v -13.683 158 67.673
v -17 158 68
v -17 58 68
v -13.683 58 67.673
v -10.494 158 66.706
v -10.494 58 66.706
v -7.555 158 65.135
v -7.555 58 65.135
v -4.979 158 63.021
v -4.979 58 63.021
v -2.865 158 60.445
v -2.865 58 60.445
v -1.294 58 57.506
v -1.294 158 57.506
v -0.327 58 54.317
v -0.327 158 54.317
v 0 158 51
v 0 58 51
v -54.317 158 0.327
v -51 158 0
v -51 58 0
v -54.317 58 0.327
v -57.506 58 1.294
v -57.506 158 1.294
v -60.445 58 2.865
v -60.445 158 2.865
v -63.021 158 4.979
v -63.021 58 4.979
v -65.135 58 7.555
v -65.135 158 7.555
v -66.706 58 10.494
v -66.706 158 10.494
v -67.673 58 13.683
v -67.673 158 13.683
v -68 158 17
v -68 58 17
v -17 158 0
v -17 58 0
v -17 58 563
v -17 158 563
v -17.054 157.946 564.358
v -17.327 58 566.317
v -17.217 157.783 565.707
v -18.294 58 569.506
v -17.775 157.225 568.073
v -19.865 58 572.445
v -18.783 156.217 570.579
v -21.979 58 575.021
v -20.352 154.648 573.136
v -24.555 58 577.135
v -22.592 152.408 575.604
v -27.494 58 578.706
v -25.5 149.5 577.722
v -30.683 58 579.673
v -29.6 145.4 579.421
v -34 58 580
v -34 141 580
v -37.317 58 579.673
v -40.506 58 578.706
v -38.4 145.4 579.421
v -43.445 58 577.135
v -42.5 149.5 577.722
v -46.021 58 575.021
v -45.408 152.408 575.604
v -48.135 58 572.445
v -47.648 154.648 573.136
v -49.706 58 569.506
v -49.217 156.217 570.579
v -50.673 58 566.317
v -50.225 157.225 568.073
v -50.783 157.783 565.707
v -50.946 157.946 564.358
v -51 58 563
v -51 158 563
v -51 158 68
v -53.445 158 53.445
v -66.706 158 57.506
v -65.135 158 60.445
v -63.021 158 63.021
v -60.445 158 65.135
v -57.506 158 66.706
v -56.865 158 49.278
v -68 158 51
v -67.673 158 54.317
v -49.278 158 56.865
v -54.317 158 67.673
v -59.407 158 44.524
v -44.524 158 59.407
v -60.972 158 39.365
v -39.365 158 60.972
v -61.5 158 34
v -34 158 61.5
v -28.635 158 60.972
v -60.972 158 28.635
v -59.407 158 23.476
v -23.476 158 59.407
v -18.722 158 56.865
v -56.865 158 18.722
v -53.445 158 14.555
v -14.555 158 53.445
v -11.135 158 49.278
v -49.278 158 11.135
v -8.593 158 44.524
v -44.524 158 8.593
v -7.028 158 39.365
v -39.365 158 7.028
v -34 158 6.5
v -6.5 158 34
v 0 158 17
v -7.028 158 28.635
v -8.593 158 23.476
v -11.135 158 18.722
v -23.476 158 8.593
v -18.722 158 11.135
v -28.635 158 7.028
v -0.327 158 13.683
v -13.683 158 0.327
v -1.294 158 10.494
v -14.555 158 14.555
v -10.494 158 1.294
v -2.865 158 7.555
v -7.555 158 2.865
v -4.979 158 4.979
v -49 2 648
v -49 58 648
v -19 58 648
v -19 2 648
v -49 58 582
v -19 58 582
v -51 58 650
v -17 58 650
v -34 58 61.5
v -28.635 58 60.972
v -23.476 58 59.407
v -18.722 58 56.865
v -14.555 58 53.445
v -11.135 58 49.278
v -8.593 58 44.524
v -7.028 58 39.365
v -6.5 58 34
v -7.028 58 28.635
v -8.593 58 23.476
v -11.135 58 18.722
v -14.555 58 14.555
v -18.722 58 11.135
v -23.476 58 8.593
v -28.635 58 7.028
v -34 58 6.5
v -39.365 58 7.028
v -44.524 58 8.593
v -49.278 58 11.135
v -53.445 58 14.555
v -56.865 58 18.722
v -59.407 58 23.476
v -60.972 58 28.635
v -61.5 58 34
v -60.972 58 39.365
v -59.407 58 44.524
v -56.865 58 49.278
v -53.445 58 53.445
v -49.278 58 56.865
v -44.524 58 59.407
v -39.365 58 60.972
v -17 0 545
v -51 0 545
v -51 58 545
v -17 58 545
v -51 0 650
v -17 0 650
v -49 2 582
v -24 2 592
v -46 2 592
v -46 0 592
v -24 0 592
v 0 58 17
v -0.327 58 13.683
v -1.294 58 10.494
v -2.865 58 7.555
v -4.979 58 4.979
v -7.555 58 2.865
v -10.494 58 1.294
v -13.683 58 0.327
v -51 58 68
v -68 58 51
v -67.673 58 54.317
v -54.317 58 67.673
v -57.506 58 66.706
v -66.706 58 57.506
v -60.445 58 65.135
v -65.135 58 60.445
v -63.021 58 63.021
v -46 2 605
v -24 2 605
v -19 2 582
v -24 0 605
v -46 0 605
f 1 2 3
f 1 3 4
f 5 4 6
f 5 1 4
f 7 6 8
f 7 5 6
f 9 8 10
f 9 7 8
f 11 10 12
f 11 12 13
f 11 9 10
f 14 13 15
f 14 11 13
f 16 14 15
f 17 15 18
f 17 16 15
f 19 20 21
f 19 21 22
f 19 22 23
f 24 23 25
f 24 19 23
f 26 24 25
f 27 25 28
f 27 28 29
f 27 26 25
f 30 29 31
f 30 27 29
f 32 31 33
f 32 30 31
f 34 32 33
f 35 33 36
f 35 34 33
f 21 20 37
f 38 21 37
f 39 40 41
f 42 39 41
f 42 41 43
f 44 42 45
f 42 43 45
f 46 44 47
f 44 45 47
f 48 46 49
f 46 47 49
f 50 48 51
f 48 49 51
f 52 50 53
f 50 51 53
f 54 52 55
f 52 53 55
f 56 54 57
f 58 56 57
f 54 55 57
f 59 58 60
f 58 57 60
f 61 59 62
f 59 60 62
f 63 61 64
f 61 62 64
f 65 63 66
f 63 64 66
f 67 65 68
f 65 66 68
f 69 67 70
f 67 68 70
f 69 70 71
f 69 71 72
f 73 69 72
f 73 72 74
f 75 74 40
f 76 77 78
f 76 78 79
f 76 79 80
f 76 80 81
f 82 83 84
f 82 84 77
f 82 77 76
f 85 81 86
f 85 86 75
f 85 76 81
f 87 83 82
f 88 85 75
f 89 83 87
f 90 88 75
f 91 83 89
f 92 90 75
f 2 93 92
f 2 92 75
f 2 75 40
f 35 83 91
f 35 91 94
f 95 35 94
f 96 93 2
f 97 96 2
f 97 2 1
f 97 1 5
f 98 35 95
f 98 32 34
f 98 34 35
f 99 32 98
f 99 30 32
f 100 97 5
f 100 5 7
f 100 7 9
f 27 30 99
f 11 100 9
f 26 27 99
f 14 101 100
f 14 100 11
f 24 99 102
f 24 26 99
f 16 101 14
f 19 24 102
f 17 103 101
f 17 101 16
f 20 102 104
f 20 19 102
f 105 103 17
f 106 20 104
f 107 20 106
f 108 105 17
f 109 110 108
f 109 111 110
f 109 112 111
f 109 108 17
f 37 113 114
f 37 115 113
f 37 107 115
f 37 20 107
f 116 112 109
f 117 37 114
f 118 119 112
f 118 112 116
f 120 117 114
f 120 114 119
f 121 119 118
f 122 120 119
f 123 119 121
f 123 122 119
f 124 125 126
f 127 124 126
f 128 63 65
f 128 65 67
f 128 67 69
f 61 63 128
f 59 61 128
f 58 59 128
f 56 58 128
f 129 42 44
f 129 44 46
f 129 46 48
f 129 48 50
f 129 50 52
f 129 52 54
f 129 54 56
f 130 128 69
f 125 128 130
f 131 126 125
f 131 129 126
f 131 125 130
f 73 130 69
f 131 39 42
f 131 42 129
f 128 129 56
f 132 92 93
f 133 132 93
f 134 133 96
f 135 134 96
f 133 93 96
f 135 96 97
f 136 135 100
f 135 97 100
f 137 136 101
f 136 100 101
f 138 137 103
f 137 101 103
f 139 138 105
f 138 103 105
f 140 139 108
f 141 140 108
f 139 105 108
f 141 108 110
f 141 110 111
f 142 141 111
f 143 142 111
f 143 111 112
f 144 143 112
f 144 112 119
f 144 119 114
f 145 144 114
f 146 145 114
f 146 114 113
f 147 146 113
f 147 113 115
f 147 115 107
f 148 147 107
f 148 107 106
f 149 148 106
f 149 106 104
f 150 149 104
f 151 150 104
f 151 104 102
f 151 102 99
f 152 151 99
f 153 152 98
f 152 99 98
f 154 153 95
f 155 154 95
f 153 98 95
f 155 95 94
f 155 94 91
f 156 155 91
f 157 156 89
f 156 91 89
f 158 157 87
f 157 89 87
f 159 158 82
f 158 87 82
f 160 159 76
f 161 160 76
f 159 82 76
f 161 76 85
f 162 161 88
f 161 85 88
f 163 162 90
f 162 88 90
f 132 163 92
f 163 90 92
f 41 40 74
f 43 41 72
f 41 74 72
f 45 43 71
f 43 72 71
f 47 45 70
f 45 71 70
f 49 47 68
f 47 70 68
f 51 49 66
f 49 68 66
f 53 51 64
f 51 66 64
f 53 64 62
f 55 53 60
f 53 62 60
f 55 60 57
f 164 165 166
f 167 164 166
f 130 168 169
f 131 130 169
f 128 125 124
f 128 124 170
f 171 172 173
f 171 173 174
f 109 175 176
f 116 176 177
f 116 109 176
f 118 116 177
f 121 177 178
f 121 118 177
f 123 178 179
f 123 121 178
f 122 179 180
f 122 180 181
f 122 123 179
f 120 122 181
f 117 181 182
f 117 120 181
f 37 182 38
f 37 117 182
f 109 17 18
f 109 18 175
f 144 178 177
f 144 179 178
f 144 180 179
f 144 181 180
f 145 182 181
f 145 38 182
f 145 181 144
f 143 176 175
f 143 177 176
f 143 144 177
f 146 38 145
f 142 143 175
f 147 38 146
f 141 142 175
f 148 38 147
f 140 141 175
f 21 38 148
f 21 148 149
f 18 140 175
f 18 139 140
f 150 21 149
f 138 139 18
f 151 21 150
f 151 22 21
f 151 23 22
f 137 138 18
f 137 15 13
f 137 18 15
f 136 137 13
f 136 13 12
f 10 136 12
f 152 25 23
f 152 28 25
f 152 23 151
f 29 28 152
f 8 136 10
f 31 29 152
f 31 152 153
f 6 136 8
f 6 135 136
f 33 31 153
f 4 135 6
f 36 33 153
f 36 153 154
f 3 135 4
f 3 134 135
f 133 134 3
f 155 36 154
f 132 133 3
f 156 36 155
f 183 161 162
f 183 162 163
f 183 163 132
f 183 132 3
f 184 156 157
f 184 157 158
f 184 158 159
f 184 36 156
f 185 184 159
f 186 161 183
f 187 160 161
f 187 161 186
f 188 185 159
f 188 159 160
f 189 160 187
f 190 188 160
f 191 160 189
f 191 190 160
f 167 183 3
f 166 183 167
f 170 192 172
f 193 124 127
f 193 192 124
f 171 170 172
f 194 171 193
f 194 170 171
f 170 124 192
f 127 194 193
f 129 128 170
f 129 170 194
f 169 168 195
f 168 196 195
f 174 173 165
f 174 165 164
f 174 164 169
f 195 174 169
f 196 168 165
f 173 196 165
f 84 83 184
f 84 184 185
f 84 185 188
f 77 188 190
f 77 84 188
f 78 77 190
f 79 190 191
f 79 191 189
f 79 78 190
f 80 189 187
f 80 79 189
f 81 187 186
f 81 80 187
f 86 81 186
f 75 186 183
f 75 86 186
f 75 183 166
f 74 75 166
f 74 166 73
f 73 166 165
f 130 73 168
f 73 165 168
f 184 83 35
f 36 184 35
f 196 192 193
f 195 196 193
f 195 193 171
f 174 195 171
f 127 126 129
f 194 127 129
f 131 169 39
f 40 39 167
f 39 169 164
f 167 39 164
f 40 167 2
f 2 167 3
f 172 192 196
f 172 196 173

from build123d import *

# Parameters (mm, degrees)
SKETCH2_W           = 34
SKETCH2_H           = 512
SKETCH2_H_2         = 70
SKETCH2_W_2         = 68
SKETCH2_H_3         = 68
BOSS_EXTRUDE1_DEPTH = 158
FILLET1_R           = 17
SKETCH3_W           = 599.373930515
SKETCH3_H           = 58
CUT_EXTRUDE1_DEPTH  = 158
SKETCH4_W           = 68
SKETCH4_H           = 58
CUT_EXTRUDE2_DEPTH  = 158
SKETCH5_R           = 27.5
CUT_EXTRUDE3_DEPTH  = 158
SKETCH6_W           = 70
SKETCH6_H           = 100
CUT_EXTRUDE4_DEPTH  = 84
SKETCH7_W           = 30
SKETCH7_H           = 66
CUT_EXTRUDE6_DEPTH  = 56
SKETCH8_W           = 22
SKETCH8_H           = 13
CUT_EXTRUDE7_DEPTH  = 56
FILLET2_R           = 17
SKETCH9_W           = 455
SKETCH9_H           = 70
CUT_EXTRUDE8_DEPTH  = 111
SKETCH10_W          = 470.461866989
SKETCH10_H          = 86.836519433
BOSS_EXTRUDE3_DEPTH = 34


# Some blends are built 0.0001 mm under size
with BuildPart() as part:
    # Sketch2 → Boss-Extrude1 (new body)
    with BuildSketch(Plane(origin=(0, 0, 0), x_dir=(1, 0, 0), z_dir=(0, 1, 0))):
        with Locations((-34, -324)):
            Rectangle(SKETCH2_W, SKETCH2_H)
        with Locations((-34, -615)):
            Rectangle(SKETCH2_W, SKETCH2_H_2)
        with Locations((-34, -34)):
            Rectangle(SKETCH2_W_2, SKETCH2_H_3)
    extrude(amount=BOSS_EXTRUDE1_DEPTH)

    # Fillet1
    fillet1_edges = [part.edges().sort_by_distance(p)[0] for p in [
        (0, 79, 0),
        (0, 79, 68),
        (-68, 79, 0),
        (-68, 79, 68),
    ]]
    fillet(fillet1_edges, radius=FILLET1_R - 0.0001)  # a hair under: the kernel refuses the full size

    # Sketch3 → Cut-Extrude1 (cut)
    with BuildSketch(Plane.ZY.offset(51)):
        with Locations((245.313034743, 29)):
            Rectangle(SKETCH3_W, SKETCH3_H)
    extrude(amount=-CUT_EXTRUDE1_DEPTH, mode=Mode.SUBTRACT)

    # Sketch4 → Cut-Extrude2 (cut)
    with BuildSketch(Plane(origin=(-51, 0, 0), x_dir=(0, 0, -1), z_dir=(1, 0, 0))):
        with Locations((-34, 29)):
            Rectangle(SKETCH4_W, SKETCH4_H)
    extrude(amount=-CUT_EXTRUDE2_DEPTH, mode=Mode.SUBTRACT)

    # Sketch5 → Cut-Extrude3 (cut)
    with BuildSketch(Plane(origin=(0, 158, 0), x_dir=(1, 0, 0), z_dir=(0, 1, 0))):
        with Locations(Location((-34, -34, 0), (0, 0, 270))):
            Circle(SKETCH5_R)
    extrude(amount=-CUT_EXTRUDE3_DEPTH, mode=Mode.SUBTRACT)

    # Sketch6 → Cut-Extrude4 (cut)
    with BuildSketch(Plane.ZY.offset(51)):
        with Locations((615, 108)):
            Rectangle(SKETCH6_W, SKETCH6_H)
    extrude(amount=-CUT_EXTRUDE4_DEPTH, mode=Mode.SUBTRACT)

    # Sketch7 → Cut-Extrude6 (cut)
    with BuildSketch(Plane(origin=(0, 58, 0), x_dir=(1, 0, 0), z_dir=(0, 1, 0))):
        with Locations((-34, -615)):
            Rectangle(SKETCH7_W, SKETCH7_H)
    extrude(amount=-CUT_EXTRUDE6_DEPTH, mode=Mode.SUBTRACT)

    # Sketch8 → Cut-Extrude7 (cut)
    with BuildSketch(Plane(origin=(0, 2, 0), x_dir=(1, 0, 0), z_dir=(0, 1, 0))):
        with Locations((-35, -598.5)):
            Rectangle(SKETCH8_W, SKETCH8_H)
    extrude(amount=-CUT_EXTRUDE7_DEPTH, mode=Mode.SUBTRACT)

    # Fillet2
    # the kernel refuses this fillet: 17 mm, written as the material it adds along each edge
    # the kernel refuses this fillet: 17 mm, written as the material it takes off along each edge
    with BuildSketch(Plane(origin=(-93.5, 158, 580), x_dir=(0, 0, -1), z_dir=(1, 0, 0))) as fillet2_2_piece_1:
        with BuildLine():
            CenterArc((FILLET2_R, -FILLET2_R), FILLET2_R, 90, 90)
            Line((0, -FILLET2_R), (0, 0))
            Line((0, 0), (FILLET2_R, 0))
        make_face()
    extrude(amount=119, mode=Mode.SUBTRACT)
    with BuildSketch(Plane(origin=(-17, 200.5, 580), x_dir=(0, 0, -1), z_dir=(0, -1, 0))) as fillet2_2_piece_2:
        with BuildLine():
            CenterArc((FILLET2_R, -FILLET2_R), FILLET2_R, 90, 90)
            Line((0, -FILLET2_R), (0, 0))
            Line((0, 0), (FILLET2_R, 0))
        make_face()
    extrude(amount=142.5, mode=Mode.SUBTRACT)
    with BuildSketch(Plane(origin=(-51, 200.5, 580), x_dir=(0, 0, -1), z_dir=(0, -1, 0))) as fillet2_2_piece_3:
        with BuildLine():
            CenterArc((FILLET2_R, FILLET2_R), FILLET2_R, 180, 90)
            Line((0, FILLET2_R), (0, 0))
            Line((0, 0), (FILLET2_R, 0))
        make_face()
    extrude(amount=142.5, mode=Mode.SUBTRACT)

    # Sketch9 → Cut-Extrude8 (cut)
    with BuildSketch(Plane(origin=(-17, 0, 0), x_dir=(0, 0, -1), z_dir=(1, 0, 0))):
        with Locations((-315.5, 108)):
            Rectangle(SKETCH9_W, SKETCH9_H)
    extrude(amount=-CUT_EXTRUDE8_DEPTH, mode=Mode.SUBTRACT)

    # Sketch10 → Boss-Extrude3 (add)
    with BuildSketch(Plane.ZY.offset(51)):
        with Locations((313.691639381, 107.94529393)):
            Rectangle(SKETCH10_W, SKETCH10_H)
    extrude(amount=-BOSS_EXTRUDE3_DEPTH)


solid = part.part
